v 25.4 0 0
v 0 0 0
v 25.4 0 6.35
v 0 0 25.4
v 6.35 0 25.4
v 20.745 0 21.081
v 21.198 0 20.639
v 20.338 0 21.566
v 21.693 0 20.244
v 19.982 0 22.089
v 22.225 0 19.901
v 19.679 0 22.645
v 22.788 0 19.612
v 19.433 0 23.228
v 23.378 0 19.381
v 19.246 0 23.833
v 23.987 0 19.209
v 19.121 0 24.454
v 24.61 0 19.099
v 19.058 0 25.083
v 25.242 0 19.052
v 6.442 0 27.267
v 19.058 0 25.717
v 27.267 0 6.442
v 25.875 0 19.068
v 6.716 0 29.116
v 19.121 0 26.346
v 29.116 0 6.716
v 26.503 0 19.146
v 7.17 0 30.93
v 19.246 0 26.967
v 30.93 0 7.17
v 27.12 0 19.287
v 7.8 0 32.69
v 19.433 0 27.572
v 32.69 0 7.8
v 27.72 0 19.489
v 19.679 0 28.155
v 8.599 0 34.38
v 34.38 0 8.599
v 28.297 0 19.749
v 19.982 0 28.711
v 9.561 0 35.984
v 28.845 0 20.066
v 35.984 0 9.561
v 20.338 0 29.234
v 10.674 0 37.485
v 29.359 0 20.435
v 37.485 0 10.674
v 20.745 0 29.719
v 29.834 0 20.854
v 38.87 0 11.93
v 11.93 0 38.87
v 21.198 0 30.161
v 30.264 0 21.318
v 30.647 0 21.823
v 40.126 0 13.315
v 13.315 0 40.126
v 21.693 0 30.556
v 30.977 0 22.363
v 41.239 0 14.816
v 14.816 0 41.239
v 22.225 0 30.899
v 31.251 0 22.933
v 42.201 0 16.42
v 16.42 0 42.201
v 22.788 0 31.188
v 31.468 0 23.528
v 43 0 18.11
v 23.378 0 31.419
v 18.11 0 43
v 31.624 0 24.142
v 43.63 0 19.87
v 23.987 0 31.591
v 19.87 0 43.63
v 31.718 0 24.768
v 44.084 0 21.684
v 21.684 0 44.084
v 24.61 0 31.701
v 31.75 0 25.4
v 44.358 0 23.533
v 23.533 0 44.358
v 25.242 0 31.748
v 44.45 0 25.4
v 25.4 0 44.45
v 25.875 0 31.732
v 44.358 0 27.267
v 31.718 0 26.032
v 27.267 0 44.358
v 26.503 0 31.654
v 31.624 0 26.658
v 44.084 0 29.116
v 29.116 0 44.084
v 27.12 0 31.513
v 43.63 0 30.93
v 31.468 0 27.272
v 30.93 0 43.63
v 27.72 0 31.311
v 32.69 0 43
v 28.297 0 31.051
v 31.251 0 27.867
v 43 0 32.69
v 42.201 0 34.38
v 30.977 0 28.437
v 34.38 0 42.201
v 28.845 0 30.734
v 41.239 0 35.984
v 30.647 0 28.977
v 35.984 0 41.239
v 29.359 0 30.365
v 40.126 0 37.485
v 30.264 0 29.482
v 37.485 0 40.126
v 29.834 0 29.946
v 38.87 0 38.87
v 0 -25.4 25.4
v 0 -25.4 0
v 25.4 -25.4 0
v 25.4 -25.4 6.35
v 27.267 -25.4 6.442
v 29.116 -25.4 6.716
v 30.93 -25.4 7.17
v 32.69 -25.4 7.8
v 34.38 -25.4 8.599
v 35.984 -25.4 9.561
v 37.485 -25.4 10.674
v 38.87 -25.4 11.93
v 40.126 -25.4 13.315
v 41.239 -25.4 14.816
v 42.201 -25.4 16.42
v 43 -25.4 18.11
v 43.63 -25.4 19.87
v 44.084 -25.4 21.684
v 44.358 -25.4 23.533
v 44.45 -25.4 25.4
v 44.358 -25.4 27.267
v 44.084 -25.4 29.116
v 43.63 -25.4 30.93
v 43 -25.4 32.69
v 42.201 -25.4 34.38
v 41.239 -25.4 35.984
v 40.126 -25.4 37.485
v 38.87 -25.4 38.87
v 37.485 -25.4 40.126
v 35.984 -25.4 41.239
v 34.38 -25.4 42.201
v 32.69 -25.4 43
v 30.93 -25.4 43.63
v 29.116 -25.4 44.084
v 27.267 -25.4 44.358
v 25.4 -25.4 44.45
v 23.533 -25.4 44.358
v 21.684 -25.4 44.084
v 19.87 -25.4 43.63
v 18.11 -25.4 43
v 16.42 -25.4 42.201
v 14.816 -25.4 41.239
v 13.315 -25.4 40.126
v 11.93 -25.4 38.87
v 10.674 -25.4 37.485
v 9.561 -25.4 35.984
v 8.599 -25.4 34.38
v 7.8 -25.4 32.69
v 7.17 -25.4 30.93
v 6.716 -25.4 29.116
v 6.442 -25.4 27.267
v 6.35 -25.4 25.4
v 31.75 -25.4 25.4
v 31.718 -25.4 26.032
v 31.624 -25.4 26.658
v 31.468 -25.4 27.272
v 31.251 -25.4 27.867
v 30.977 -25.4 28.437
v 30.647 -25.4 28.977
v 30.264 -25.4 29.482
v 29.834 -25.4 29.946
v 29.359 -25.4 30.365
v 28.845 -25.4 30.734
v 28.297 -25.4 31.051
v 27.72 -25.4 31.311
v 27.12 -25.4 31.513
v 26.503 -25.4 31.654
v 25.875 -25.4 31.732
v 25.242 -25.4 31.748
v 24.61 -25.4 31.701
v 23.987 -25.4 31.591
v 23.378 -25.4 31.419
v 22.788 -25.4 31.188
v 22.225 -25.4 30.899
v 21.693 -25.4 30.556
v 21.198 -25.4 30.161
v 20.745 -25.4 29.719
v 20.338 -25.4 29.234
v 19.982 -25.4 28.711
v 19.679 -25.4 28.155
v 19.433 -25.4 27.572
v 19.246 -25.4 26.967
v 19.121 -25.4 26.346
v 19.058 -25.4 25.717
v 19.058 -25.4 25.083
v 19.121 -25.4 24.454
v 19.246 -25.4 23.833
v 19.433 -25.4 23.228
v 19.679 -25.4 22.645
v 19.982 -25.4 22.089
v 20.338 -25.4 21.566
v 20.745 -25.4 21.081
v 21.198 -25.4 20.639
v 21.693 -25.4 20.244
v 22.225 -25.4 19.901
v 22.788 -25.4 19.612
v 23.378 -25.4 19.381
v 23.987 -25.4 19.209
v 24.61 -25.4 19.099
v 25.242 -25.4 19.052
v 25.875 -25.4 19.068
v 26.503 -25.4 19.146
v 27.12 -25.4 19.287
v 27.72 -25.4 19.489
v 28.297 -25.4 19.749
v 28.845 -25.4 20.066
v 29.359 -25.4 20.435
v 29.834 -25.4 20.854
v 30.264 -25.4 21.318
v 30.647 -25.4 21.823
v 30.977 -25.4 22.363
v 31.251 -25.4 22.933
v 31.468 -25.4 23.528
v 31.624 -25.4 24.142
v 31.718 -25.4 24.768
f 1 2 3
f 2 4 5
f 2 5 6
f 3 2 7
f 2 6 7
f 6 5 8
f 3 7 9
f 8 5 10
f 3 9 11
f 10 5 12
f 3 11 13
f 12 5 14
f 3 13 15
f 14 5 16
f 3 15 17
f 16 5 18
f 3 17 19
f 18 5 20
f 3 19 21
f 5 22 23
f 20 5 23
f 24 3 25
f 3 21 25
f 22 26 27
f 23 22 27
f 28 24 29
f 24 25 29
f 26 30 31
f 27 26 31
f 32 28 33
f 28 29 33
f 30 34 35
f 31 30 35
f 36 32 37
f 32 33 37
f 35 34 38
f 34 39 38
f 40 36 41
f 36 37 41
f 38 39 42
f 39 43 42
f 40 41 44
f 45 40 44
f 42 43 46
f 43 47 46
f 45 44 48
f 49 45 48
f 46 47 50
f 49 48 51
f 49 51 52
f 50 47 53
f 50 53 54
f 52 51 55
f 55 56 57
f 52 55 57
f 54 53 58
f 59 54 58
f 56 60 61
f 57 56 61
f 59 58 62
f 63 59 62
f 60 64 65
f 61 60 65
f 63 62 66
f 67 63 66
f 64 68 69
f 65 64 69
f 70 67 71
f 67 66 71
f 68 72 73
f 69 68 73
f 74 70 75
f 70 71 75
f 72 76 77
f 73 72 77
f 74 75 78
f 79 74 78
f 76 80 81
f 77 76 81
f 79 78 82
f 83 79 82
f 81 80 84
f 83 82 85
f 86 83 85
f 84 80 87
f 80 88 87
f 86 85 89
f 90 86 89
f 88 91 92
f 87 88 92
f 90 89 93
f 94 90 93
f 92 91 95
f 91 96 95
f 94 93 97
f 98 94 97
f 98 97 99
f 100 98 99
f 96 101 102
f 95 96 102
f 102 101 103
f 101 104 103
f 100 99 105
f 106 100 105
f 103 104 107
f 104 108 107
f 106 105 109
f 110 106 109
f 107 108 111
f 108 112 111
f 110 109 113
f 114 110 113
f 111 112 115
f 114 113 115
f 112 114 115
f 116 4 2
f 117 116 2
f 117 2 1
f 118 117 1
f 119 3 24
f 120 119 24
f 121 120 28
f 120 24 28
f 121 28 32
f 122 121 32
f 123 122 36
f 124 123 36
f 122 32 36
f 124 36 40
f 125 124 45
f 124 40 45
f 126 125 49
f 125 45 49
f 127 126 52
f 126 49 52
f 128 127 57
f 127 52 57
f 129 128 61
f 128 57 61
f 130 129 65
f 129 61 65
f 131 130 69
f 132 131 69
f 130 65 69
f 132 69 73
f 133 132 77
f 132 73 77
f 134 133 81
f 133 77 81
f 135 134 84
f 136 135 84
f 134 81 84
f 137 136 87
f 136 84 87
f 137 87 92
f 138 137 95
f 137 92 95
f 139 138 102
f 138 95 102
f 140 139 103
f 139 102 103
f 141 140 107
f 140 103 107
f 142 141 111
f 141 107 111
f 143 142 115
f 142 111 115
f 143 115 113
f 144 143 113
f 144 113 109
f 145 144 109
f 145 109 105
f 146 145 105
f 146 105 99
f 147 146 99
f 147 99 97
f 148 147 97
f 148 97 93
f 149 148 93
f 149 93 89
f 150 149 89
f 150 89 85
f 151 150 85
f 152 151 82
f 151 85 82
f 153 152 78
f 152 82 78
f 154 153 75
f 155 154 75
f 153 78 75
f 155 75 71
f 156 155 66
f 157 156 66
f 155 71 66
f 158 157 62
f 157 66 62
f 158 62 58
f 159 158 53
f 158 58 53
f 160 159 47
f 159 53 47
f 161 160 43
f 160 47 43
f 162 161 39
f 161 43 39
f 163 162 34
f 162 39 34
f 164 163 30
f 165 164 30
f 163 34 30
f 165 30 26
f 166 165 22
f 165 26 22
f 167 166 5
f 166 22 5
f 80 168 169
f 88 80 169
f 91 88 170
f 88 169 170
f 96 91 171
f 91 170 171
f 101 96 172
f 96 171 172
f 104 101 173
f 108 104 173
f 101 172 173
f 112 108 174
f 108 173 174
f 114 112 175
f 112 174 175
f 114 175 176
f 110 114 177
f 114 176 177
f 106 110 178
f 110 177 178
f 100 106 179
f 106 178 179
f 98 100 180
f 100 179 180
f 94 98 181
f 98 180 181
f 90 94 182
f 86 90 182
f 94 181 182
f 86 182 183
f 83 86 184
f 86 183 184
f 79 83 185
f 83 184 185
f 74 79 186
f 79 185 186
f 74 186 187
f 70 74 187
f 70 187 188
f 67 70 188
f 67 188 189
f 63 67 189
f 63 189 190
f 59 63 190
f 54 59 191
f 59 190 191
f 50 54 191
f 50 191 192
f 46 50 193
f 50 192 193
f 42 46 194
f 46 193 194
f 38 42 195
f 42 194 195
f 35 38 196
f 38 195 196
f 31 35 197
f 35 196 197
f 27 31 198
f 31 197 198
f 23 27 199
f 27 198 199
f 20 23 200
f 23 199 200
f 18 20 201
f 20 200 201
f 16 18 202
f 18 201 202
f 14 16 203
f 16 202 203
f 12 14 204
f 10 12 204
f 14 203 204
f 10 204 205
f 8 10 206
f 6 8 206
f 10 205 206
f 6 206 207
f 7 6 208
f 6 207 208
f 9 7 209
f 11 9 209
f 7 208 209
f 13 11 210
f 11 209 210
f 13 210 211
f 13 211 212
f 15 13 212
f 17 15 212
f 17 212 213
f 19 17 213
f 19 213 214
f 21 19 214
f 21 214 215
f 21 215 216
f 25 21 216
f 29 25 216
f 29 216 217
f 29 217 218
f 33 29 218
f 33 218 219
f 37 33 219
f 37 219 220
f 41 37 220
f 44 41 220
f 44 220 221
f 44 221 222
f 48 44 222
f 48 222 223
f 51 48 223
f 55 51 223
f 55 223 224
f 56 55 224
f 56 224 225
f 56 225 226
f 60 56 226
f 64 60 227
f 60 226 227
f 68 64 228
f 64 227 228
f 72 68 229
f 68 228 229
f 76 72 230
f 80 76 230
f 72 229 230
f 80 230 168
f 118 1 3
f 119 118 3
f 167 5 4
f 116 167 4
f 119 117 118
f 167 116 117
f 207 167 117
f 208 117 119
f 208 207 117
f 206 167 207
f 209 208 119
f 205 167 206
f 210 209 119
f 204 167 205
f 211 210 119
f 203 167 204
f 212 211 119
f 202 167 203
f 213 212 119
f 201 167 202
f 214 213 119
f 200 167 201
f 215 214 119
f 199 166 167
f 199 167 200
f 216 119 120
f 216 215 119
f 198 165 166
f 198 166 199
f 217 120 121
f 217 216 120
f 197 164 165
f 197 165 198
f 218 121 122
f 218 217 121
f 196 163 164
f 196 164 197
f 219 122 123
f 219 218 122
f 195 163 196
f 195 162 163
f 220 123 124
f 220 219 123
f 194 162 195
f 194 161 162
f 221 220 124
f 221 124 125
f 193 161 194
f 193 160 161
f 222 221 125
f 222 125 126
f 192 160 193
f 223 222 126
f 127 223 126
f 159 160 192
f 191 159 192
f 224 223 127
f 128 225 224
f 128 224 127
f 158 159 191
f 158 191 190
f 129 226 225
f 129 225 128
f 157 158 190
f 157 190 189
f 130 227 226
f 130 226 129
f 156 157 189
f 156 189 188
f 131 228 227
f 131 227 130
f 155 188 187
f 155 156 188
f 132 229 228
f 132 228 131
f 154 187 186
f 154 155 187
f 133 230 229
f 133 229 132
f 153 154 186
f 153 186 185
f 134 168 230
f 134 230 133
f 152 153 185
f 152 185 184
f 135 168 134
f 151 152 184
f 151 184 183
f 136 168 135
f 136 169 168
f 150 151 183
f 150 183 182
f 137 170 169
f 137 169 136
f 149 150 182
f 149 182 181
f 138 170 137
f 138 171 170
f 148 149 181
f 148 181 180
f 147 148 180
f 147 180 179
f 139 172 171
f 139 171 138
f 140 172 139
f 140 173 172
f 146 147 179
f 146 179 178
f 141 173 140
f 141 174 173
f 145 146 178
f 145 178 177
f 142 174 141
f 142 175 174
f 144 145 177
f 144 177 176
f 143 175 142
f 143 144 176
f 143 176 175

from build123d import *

# Parameters (mm, degrees)
F1_DEPTH = 25.4
F2_R     = 6.35
F3_DEPTH = 25.4


with BuildPart() as f1:
    # F0 (on Front) → F1 (new body)
    with BuildSketch(Plane.XZ):
        with BuildLine():
            Line((0, 25.4), (0, 0))
            Line((0, 0), (25.4, 0))
            Line((25.4, 0), (25.4, 6.35))
            ThreePointArc((25.4, 6.35), (38.870384, 38.870384), (6.35, 25.4))
            Line((6.35, 25.4), (0, 25.4))
        make_face()
    extrude(amount=F1_DEPTH)

    # F2 (on face) → F3 (cut)
    with BuildSketch(Plane.XZ.offset(25.4)):
        with Locations((25.4, 25.4)):
            Circle(F2_R)
    extrude(amount=-F3_DEPTH, mode=Mode.SUBTRACT)


solid = f1.part
